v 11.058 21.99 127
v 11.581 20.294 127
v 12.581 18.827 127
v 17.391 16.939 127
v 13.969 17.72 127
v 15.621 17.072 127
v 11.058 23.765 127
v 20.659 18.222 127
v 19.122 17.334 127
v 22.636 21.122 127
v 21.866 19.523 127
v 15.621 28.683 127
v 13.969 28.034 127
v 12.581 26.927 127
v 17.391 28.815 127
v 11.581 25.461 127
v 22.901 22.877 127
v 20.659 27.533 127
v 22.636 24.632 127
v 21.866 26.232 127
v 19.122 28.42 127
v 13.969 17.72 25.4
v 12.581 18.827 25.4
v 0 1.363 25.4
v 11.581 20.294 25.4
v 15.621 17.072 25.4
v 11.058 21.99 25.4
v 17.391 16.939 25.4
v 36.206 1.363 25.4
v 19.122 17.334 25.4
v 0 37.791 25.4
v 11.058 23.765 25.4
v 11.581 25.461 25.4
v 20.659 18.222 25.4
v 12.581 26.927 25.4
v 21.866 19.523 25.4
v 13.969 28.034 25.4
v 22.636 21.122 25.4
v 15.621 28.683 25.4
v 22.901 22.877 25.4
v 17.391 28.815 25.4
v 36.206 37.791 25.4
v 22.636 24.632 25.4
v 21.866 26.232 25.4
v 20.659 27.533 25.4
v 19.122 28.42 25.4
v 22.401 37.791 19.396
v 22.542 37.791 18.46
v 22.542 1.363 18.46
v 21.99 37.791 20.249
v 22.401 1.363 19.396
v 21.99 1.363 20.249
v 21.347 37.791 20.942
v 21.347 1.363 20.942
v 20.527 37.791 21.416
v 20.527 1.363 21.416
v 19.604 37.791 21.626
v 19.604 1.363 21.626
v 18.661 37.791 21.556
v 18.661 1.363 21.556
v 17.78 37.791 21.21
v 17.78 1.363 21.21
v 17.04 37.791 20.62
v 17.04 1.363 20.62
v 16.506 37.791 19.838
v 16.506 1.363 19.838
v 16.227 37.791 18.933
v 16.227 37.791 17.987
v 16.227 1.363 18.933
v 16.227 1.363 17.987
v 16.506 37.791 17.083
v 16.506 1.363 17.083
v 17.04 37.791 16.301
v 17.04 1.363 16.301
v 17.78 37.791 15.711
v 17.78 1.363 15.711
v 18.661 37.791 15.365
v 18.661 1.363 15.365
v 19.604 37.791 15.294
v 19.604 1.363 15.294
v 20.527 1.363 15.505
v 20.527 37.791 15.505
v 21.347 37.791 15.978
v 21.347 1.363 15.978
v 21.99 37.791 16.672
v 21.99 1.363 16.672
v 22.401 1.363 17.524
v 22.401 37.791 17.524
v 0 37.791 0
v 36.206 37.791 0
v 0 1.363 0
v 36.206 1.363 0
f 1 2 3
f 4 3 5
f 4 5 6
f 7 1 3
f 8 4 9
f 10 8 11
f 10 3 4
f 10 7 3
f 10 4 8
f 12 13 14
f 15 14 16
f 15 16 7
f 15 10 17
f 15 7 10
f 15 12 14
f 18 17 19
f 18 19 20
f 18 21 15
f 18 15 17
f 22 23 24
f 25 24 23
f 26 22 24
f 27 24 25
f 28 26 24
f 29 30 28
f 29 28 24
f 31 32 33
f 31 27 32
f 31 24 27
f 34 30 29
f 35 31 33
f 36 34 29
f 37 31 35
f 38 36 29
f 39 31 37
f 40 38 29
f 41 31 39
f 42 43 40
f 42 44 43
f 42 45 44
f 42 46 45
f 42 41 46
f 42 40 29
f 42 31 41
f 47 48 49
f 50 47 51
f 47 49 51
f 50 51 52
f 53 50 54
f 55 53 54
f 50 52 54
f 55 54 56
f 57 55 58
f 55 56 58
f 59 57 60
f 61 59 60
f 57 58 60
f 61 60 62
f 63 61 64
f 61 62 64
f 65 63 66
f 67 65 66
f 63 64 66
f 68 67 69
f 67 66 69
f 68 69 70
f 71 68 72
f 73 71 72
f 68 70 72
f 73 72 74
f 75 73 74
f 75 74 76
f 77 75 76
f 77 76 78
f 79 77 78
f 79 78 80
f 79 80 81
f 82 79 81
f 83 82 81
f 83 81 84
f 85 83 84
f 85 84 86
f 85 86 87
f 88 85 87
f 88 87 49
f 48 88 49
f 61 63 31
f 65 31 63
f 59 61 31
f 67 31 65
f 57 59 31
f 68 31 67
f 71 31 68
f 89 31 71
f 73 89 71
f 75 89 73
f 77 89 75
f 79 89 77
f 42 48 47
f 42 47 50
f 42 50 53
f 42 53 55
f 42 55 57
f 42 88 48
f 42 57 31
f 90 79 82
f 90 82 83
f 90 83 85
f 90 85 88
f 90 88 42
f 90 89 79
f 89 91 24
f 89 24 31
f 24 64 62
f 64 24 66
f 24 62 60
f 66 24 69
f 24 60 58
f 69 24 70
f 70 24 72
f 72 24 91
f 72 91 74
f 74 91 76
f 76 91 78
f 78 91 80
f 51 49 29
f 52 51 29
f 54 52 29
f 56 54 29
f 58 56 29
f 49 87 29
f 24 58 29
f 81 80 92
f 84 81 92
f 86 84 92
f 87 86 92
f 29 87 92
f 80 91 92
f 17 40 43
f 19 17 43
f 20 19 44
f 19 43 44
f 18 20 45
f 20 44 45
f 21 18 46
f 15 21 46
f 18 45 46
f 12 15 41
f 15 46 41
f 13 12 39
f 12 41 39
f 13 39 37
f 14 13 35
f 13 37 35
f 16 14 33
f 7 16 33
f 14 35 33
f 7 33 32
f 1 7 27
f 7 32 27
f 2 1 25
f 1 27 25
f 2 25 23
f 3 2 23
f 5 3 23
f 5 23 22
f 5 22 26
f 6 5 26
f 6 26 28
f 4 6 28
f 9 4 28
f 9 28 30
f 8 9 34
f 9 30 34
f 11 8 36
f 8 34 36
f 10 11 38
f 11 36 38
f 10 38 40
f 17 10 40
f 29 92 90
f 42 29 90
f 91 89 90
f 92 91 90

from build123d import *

# Parameters (mm, degrees)
F0_W     = 36.2055785954
F0_H     = 36.4281870425
F1_DEPTH = 25.4
F2_R     = 5.9545672291
F3_DEPTH = 101.6
F4_R     = 3.175
F5_DEPTH = 36.4291870425


with BuildPart() as f1:
    # F0 (on Top) → F1 (new body)
    with BuildSketch(Plane.XY):
        with Locations((18.1027892977, 19.5768494159)):
            Rectangle(F0_W, F0_H)
    extrude(amount=F1_DEPTH)

    # F2 (on face) → F3 (join)
    with BuildSketch(Plane.XY.offset(25.4)):
        with Locations((16.946144402, 22.8772908449)):
            Circle(F2_R)
    extrude(amount=F3_DEPTH)

    # F4 (on face) → F5 (cut, through all)
    with BuildSketch(Plane.XZ.offset(-1.3627558947)):
        with Locations((19.3670187145, 18.4601526707)):
            Circle(F4_R)
    extrude(amount=-F5_DEPTH, mode=Mode.SUBTRACT)


solid = f1.part
